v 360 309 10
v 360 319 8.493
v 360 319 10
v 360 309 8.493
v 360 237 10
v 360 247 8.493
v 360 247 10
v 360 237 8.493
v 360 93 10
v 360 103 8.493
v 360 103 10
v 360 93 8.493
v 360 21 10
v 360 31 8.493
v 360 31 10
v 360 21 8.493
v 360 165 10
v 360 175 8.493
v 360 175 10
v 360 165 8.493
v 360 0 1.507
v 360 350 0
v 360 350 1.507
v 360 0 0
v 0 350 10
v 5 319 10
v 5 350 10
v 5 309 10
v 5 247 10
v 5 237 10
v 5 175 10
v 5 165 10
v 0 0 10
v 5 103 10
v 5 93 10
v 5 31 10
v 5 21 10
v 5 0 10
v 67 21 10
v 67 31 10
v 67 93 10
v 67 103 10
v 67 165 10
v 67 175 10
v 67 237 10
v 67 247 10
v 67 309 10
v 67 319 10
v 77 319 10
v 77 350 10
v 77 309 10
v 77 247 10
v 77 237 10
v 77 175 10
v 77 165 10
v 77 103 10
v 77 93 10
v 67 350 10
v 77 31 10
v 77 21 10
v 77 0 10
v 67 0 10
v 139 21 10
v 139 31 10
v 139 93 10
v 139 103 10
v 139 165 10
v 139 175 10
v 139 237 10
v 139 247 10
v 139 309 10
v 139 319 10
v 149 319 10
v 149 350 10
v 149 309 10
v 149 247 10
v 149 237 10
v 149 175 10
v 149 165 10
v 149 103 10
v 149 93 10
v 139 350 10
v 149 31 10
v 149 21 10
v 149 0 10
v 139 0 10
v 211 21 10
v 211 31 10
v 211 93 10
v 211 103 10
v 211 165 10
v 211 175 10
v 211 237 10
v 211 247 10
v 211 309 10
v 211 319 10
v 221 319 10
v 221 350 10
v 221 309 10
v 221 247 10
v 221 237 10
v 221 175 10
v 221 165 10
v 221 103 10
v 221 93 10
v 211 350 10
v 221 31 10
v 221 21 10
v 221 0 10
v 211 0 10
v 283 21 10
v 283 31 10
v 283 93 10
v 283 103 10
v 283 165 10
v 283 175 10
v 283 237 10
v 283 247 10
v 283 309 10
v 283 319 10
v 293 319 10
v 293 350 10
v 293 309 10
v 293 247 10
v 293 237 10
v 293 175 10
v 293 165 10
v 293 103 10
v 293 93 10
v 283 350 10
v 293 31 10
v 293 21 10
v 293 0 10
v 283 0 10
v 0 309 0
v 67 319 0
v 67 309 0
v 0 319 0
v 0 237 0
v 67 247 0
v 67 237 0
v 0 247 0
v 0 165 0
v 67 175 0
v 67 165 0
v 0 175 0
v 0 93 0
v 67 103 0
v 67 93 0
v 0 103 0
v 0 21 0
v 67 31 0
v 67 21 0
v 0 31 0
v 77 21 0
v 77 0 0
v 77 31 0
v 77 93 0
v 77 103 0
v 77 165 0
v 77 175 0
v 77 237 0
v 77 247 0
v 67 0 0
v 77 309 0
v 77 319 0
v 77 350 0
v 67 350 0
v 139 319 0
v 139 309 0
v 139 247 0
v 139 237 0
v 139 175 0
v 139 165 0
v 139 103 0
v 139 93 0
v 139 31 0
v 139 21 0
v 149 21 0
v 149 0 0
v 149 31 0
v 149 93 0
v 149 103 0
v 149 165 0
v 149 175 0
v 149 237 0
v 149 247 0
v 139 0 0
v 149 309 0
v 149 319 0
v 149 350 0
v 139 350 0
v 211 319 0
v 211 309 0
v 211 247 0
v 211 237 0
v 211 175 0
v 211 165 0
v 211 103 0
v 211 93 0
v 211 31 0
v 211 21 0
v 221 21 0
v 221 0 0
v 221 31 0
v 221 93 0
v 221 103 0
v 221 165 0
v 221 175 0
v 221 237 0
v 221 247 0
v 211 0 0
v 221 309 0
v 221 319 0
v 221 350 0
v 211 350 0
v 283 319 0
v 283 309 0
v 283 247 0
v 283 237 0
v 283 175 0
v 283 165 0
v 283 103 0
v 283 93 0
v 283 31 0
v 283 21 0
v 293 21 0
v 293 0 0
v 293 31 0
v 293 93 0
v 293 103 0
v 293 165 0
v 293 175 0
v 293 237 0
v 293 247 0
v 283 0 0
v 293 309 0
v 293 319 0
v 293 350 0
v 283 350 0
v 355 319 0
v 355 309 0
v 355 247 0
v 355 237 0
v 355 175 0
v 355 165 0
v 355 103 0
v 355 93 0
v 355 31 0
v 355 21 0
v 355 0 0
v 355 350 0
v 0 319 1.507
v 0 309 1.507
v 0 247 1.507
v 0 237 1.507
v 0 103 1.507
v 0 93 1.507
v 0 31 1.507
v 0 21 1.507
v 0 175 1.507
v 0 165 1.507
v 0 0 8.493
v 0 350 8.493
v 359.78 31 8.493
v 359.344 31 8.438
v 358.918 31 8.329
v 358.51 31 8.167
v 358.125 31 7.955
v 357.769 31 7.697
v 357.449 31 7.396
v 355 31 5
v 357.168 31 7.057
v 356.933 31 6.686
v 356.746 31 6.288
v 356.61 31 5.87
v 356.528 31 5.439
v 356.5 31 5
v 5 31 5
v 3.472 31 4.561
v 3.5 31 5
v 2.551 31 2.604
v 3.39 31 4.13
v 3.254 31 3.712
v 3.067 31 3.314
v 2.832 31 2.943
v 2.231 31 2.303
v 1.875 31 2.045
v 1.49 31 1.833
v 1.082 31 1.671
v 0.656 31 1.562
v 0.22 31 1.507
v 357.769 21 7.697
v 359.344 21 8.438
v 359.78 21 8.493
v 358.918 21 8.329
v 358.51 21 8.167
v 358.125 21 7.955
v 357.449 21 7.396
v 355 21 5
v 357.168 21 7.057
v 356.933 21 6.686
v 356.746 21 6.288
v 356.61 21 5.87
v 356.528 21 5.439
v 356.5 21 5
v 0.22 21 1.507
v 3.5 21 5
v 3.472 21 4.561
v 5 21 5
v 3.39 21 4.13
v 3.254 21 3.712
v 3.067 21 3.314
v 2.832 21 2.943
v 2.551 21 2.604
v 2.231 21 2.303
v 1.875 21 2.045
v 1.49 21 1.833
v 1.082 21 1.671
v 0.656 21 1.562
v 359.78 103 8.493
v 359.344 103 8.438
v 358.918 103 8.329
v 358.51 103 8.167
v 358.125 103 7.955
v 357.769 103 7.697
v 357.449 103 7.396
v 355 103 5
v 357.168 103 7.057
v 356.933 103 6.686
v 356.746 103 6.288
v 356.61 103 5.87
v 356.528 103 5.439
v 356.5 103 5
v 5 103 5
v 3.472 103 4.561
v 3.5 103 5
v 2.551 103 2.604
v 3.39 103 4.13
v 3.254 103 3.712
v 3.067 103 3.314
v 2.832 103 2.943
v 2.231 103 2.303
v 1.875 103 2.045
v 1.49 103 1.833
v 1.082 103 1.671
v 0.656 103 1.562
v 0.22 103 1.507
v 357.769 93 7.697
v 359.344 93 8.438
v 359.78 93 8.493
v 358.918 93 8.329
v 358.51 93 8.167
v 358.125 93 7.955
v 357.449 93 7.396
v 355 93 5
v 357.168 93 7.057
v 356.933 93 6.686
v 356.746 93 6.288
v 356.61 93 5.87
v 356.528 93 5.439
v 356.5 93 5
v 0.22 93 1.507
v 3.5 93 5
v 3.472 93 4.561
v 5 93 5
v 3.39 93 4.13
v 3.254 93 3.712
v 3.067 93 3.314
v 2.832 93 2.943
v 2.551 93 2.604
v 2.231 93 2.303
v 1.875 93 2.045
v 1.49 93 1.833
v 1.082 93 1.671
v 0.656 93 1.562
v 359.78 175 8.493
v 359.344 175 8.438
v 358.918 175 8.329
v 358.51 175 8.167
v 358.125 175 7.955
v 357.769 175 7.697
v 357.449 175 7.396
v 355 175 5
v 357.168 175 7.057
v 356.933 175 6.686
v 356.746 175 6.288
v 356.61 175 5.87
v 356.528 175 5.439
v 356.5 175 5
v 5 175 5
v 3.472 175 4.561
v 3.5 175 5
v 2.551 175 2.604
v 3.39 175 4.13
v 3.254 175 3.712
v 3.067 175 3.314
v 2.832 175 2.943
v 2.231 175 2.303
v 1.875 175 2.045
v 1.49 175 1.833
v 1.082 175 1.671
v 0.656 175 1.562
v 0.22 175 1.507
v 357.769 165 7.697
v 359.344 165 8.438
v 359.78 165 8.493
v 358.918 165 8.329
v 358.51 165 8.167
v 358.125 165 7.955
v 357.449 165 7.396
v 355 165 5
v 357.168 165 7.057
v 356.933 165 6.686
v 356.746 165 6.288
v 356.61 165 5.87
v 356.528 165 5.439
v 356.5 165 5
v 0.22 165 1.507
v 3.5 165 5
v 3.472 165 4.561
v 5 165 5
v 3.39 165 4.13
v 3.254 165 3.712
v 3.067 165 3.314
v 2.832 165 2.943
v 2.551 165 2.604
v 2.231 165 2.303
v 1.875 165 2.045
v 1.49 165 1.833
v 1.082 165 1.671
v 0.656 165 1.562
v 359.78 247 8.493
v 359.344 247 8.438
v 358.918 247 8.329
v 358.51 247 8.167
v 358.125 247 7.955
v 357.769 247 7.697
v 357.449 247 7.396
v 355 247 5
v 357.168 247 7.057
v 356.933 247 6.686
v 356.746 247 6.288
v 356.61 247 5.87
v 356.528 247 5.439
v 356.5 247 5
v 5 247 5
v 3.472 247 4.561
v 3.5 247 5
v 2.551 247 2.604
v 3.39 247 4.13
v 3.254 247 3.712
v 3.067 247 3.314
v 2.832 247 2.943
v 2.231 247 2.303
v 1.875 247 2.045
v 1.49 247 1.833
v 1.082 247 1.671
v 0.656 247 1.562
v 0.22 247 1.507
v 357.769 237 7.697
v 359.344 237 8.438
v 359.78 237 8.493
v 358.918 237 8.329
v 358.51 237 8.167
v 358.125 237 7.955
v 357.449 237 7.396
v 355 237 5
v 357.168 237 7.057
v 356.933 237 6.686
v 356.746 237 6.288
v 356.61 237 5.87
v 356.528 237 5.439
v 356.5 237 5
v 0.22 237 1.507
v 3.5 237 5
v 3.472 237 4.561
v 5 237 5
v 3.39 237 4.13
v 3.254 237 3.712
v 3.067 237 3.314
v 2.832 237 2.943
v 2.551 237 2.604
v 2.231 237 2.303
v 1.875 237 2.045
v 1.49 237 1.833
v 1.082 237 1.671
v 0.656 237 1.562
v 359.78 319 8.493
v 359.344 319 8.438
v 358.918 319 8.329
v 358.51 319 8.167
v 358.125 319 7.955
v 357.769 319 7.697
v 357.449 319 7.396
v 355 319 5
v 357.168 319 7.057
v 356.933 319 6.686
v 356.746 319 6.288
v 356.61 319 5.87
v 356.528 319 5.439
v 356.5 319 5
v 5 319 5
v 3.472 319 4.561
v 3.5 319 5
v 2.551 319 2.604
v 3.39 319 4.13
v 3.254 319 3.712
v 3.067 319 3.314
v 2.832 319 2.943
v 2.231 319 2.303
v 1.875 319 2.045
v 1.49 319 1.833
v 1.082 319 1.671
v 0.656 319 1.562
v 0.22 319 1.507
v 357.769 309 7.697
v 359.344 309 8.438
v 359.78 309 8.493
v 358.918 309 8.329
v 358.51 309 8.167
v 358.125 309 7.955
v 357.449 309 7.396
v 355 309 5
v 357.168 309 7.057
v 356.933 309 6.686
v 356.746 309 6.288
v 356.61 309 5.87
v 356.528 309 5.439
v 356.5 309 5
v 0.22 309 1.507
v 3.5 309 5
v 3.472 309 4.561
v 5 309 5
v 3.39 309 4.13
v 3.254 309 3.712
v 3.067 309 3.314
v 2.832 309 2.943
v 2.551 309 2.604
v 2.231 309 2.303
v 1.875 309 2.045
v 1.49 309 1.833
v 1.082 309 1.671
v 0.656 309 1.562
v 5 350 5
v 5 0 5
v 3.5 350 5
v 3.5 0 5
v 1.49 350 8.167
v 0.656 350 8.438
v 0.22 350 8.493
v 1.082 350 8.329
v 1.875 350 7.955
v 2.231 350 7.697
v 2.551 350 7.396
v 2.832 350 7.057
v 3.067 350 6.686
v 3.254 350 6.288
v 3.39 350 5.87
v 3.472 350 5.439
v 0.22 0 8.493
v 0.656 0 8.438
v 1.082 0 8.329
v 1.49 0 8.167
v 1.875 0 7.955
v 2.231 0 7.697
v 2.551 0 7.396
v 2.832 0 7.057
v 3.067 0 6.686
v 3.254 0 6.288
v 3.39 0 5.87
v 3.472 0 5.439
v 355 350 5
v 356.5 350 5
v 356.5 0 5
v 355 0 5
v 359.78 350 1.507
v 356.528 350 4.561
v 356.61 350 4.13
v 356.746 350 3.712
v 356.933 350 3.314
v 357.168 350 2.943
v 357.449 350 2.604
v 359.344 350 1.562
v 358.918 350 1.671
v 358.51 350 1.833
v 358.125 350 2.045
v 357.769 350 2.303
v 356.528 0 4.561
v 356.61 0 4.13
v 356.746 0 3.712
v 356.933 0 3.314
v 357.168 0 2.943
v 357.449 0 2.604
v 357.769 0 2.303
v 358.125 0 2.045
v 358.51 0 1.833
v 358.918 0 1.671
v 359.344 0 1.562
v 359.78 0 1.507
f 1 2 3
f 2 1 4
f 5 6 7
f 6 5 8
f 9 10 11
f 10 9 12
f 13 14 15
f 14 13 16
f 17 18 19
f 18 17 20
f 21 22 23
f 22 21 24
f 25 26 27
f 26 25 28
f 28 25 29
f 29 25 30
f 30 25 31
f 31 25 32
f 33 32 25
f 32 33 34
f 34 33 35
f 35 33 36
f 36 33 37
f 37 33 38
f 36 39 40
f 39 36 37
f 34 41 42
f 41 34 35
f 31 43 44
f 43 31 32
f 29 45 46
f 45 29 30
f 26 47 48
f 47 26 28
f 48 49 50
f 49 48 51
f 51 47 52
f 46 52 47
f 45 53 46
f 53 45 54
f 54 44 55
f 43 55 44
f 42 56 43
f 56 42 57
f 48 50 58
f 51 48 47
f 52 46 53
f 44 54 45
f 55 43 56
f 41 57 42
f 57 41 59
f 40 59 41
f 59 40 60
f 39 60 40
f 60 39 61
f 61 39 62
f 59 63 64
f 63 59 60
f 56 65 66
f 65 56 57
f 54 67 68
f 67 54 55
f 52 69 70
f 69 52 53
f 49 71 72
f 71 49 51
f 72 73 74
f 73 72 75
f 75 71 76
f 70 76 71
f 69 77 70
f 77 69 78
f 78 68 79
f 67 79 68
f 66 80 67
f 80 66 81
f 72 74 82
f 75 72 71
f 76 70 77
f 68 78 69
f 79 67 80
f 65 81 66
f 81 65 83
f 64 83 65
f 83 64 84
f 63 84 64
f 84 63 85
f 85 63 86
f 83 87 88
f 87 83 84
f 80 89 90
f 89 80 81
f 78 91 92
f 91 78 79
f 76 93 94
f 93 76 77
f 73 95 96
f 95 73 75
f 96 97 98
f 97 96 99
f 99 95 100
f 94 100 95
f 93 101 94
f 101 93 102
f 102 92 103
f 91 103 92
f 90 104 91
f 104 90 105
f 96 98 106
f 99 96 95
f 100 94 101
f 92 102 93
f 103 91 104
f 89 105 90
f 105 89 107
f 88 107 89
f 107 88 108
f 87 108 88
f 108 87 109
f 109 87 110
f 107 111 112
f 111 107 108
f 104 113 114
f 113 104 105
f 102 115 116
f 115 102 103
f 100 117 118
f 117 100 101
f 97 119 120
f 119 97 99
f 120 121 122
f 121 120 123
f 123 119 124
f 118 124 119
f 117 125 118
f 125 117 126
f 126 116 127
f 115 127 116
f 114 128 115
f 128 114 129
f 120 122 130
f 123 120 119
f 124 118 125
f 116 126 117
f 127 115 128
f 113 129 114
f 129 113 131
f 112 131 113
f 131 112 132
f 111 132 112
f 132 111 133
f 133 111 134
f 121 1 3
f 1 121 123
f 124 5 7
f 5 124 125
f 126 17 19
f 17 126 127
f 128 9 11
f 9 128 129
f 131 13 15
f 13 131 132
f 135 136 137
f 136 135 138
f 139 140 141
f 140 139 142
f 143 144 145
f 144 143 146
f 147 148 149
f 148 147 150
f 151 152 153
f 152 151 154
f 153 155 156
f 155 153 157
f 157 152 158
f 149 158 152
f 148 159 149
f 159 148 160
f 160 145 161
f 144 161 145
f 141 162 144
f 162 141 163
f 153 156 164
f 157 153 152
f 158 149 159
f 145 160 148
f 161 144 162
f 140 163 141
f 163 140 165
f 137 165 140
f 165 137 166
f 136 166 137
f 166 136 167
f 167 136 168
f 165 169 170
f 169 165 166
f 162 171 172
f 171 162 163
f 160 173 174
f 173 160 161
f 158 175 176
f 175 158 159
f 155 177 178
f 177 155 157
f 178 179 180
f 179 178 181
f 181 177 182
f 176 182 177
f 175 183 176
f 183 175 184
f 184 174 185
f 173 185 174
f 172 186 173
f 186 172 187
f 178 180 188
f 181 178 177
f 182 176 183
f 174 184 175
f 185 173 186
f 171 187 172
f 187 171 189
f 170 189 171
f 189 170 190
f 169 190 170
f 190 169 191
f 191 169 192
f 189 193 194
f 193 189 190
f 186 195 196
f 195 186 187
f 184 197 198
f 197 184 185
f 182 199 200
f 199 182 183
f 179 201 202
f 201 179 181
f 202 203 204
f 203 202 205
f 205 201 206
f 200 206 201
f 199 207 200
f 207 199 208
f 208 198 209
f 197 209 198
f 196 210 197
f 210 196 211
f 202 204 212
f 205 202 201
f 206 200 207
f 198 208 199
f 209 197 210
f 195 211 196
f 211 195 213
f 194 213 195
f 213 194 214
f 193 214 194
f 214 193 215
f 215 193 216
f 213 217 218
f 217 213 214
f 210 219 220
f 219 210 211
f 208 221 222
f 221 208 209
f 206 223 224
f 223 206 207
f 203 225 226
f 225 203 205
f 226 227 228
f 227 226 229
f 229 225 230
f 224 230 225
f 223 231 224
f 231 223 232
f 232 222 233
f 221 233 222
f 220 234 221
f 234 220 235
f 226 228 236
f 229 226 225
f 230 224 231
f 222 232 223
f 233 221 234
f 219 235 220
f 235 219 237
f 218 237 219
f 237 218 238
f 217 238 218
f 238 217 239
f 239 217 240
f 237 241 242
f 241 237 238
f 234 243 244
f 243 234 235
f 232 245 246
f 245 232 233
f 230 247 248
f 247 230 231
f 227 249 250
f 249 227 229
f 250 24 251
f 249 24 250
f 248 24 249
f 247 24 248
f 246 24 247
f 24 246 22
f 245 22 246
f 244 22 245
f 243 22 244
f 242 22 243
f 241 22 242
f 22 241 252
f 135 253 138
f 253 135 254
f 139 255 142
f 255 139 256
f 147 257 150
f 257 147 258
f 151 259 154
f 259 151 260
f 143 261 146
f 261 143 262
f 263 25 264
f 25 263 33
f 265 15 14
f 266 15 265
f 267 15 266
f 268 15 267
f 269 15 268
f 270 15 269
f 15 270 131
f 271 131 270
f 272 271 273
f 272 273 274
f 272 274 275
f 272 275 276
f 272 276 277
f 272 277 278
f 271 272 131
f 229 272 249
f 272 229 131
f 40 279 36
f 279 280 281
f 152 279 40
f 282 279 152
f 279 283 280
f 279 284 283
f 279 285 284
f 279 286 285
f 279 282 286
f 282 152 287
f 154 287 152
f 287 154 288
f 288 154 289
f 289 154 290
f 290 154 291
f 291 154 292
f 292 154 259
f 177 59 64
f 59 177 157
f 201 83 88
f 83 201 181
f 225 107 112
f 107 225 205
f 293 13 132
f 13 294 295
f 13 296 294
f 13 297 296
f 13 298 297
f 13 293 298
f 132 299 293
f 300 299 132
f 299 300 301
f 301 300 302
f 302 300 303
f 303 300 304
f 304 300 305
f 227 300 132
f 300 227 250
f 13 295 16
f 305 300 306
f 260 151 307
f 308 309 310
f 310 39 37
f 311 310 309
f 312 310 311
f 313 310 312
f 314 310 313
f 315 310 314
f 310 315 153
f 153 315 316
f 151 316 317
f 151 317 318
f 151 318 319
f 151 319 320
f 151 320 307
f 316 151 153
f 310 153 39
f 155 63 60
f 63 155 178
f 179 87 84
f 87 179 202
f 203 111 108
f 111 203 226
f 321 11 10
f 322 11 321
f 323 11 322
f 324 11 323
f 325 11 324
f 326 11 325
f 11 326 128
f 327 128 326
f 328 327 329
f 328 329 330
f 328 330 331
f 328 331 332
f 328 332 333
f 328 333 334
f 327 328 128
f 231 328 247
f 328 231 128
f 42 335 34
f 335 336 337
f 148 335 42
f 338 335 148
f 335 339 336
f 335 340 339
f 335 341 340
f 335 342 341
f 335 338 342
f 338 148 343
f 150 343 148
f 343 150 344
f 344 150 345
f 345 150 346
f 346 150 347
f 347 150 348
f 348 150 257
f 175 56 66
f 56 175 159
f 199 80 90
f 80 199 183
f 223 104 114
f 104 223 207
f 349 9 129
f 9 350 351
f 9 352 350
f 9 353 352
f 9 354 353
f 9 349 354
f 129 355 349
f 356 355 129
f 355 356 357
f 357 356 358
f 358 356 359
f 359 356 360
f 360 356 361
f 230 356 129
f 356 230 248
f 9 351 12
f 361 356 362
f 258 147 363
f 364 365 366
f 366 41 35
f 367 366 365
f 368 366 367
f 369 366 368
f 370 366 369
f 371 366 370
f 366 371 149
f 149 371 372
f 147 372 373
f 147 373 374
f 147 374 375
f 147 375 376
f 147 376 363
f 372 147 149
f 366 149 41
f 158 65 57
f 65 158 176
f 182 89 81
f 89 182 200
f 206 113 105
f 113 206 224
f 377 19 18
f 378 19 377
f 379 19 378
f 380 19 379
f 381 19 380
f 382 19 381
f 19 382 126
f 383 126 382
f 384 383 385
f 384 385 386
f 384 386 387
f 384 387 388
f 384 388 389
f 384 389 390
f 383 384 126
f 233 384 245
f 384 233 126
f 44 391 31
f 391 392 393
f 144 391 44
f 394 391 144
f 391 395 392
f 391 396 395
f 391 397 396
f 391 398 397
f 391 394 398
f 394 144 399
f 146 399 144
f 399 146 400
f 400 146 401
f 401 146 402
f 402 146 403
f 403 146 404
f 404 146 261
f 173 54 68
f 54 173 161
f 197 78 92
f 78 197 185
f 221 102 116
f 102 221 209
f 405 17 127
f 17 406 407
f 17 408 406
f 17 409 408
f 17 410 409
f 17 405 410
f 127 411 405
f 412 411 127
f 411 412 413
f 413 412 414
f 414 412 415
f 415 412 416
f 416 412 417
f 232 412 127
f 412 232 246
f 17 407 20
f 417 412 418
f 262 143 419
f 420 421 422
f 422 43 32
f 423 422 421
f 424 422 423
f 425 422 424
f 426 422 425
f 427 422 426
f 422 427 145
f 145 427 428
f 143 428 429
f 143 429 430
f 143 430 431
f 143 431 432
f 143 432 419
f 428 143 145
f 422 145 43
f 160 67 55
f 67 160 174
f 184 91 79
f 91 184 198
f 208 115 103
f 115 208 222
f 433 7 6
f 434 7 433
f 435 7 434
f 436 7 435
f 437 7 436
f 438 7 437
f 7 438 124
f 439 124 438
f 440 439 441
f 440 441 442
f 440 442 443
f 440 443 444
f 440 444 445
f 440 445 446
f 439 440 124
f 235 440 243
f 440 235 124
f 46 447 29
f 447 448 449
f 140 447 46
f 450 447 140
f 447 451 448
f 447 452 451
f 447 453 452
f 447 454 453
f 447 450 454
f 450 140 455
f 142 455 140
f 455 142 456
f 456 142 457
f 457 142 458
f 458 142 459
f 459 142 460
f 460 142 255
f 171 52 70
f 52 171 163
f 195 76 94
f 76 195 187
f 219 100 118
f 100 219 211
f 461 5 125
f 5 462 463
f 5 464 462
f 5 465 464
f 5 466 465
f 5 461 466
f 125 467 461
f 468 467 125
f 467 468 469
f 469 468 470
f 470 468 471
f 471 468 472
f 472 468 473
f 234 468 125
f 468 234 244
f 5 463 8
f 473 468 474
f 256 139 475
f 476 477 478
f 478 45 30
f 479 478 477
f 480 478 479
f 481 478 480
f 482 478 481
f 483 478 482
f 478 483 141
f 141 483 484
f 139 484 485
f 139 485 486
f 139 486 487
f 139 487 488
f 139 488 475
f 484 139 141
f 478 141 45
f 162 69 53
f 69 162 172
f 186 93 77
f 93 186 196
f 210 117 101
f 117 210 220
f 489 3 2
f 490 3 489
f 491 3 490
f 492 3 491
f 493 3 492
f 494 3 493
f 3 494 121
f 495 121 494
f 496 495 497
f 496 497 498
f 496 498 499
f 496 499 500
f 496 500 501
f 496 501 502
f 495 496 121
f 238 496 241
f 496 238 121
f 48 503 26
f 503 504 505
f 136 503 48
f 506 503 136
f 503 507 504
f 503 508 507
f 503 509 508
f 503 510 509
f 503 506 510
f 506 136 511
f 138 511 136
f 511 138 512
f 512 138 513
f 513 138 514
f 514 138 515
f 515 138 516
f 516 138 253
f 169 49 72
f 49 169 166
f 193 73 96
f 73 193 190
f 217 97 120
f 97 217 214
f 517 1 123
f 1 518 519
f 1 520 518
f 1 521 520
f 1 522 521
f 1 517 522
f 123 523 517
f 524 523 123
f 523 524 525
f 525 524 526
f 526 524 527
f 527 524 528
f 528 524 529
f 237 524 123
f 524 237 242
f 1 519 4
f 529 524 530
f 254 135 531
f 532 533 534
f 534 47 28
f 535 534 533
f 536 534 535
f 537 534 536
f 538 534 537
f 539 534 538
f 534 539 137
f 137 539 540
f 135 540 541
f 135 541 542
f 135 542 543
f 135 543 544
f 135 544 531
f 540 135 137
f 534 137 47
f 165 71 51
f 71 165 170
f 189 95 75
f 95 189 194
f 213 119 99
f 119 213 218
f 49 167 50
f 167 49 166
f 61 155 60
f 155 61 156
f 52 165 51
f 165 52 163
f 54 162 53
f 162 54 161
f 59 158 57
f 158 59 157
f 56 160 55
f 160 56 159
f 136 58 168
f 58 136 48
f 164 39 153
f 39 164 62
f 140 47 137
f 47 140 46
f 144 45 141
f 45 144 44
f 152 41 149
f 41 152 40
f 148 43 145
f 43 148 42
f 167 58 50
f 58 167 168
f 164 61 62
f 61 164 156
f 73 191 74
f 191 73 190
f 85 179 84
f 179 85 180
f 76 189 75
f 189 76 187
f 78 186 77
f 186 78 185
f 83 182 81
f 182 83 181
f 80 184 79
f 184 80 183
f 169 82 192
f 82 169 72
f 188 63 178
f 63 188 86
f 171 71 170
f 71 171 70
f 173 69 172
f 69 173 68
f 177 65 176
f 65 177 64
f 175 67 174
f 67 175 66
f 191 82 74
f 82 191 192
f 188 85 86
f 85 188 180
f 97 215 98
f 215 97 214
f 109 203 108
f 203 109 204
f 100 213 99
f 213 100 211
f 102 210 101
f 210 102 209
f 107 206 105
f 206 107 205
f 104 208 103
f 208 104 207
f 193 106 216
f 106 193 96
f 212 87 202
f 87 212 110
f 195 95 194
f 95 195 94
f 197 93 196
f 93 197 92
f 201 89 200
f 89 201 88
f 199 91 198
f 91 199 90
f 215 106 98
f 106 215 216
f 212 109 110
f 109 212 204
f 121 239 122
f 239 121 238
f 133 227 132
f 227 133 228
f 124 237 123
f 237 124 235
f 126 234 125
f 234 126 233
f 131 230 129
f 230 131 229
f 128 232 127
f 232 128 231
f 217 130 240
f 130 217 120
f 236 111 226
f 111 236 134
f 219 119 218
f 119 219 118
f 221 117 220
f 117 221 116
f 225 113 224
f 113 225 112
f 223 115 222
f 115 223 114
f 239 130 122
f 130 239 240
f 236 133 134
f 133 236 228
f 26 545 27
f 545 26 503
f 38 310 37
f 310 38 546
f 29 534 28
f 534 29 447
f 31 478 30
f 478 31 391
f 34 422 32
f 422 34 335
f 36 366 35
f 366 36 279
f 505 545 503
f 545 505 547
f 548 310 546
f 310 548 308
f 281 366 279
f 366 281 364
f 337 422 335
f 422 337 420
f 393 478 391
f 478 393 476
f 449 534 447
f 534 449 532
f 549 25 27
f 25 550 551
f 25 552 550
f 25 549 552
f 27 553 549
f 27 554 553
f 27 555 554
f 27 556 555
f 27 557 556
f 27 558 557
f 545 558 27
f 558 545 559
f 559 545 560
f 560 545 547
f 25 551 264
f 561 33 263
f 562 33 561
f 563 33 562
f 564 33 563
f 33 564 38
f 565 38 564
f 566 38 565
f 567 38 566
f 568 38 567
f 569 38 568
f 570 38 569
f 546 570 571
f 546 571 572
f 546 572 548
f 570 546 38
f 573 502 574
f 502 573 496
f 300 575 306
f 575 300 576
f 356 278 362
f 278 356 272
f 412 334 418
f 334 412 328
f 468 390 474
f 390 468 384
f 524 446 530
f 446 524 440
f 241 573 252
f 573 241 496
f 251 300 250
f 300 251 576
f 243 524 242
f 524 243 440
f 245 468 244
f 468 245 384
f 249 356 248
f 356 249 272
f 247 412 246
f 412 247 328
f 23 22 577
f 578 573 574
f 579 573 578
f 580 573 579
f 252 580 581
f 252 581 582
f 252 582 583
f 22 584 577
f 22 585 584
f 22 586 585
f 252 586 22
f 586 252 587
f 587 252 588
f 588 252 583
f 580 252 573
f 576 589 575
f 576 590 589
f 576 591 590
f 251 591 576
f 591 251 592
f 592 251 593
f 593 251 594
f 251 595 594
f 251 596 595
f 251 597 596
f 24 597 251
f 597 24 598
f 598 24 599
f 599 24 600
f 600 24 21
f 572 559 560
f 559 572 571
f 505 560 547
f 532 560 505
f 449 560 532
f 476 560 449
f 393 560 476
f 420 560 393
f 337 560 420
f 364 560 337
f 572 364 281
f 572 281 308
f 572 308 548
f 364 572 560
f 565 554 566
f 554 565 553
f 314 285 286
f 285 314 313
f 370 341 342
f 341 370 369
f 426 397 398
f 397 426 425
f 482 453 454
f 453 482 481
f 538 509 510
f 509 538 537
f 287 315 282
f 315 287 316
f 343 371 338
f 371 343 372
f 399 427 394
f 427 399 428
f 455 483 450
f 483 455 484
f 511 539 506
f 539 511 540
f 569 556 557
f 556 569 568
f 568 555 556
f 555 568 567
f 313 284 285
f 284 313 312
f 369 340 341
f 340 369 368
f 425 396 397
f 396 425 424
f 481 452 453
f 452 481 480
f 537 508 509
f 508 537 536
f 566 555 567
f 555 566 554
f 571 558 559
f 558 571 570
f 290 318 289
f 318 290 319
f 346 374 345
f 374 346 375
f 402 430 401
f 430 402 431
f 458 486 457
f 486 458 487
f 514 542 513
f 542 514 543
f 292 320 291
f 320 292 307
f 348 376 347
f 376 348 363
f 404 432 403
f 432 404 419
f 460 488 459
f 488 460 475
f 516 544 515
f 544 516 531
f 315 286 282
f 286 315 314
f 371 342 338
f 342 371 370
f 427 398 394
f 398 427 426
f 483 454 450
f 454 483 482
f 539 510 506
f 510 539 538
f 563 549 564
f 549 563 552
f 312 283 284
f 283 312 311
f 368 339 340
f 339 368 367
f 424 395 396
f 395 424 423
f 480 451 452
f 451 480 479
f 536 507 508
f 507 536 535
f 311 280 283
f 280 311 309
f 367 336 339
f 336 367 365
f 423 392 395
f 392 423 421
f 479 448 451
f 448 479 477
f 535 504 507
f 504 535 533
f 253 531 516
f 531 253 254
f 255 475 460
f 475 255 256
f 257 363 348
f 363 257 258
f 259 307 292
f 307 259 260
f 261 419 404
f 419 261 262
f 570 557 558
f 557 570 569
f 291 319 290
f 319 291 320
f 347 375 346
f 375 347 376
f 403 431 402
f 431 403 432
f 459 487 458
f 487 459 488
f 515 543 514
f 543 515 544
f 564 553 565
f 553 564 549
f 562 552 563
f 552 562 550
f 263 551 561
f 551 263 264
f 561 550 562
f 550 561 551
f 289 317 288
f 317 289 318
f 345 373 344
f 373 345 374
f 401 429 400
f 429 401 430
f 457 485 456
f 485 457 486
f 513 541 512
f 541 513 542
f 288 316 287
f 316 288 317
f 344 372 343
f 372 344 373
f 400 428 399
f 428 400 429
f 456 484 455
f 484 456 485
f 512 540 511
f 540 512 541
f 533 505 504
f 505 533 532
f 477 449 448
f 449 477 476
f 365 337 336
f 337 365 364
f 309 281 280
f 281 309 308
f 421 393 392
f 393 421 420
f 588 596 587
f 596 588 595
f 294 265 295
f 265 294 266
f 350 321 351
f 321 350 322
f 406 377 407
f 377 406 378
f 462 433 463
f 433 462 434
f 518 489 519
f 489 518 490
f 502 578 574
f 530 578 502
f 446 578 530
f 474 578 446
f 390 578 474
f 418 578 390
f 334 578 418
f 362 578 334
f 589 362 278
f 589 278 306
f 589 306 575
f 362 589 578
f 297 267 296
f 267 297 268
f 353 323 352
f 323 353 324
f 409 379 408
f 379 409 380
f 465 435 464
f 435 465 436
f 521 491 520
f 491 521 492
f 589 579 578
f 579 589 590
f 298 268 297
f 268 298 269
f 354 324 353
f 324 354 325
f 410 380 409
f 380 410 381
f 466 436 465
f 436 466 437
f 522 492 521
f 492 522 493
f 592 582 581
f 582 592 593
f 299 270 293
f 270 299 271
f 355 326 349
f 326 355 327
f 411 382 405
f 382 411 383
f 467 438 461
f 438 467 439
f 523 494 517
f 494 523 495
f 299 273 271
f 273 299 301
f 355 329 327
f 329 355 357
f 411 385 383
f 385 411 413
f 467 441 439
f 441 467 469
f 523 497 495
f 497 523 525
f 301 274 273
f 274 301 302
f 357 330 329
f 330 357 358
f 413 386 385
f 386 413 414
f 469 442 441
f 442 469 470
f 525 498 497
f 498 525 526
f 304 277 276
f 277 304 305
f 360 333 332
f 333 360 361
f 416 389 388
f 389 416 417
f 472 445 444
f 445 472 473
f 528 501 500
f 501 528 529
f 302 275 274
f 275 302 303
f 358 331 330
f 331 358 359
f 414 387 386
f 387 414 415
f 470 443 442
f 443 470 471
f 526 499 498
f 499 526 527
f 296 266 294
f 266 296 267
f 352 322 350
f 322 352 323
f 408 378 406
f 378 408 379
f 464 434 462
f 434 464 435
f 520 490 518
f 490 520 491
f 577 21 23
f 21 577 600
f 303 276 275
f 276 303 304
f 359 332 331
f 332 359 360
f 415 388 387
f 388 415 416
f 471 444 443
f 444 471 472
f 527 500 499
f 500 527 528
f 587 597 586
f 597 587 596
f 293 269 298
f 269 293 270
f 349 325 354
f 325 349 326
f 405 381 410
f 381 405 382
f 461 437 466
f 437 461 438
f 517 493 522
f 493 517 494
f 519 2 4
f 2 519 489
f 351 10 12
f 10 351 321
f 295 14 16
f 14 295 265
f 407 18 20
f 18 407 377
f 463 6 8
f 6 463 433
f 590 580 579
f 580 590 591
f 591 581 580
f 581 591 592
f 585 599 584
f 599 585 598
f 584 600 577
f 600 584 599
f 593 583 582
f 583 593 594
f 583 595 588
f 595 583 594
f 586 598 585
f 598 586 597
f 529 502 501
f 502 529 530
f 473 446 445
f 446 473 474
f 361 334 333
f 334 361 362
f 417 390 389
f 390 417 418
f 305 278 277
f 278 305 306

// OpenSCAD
difference() {
union() {
translate([67,0,0]) cube([10,350,10]);
translate([139,0,0]) cube([10,350,10]);
translate([211,0,0]) cube([10,350,10]);
translate([283,0,0]) cube([10,350,10]);
h = [26,98,170,242,314];
for (c = h) {
translate([0, c-5,0]) cube([360,10,10]);
}
translate([0,0,5]) cube([5,350,5]);
translate([355,0,0]) cube([5,350,5]);
}
// adjust for right wall
intersection() {
translate([0,175,5]) rotate([90,0,0]) cylinder(h=352, r=3.5, $fn=50, center=true);
translate([0,0,0]) cube([10,350,10]);
}
intersection() {
translate([360,175,5]) rotate([90,0,0]) cylinder(h=352, r=3.5, $fn=50, center=true);
translate([350,0,0]) cube([10,350,10]);
}
}
